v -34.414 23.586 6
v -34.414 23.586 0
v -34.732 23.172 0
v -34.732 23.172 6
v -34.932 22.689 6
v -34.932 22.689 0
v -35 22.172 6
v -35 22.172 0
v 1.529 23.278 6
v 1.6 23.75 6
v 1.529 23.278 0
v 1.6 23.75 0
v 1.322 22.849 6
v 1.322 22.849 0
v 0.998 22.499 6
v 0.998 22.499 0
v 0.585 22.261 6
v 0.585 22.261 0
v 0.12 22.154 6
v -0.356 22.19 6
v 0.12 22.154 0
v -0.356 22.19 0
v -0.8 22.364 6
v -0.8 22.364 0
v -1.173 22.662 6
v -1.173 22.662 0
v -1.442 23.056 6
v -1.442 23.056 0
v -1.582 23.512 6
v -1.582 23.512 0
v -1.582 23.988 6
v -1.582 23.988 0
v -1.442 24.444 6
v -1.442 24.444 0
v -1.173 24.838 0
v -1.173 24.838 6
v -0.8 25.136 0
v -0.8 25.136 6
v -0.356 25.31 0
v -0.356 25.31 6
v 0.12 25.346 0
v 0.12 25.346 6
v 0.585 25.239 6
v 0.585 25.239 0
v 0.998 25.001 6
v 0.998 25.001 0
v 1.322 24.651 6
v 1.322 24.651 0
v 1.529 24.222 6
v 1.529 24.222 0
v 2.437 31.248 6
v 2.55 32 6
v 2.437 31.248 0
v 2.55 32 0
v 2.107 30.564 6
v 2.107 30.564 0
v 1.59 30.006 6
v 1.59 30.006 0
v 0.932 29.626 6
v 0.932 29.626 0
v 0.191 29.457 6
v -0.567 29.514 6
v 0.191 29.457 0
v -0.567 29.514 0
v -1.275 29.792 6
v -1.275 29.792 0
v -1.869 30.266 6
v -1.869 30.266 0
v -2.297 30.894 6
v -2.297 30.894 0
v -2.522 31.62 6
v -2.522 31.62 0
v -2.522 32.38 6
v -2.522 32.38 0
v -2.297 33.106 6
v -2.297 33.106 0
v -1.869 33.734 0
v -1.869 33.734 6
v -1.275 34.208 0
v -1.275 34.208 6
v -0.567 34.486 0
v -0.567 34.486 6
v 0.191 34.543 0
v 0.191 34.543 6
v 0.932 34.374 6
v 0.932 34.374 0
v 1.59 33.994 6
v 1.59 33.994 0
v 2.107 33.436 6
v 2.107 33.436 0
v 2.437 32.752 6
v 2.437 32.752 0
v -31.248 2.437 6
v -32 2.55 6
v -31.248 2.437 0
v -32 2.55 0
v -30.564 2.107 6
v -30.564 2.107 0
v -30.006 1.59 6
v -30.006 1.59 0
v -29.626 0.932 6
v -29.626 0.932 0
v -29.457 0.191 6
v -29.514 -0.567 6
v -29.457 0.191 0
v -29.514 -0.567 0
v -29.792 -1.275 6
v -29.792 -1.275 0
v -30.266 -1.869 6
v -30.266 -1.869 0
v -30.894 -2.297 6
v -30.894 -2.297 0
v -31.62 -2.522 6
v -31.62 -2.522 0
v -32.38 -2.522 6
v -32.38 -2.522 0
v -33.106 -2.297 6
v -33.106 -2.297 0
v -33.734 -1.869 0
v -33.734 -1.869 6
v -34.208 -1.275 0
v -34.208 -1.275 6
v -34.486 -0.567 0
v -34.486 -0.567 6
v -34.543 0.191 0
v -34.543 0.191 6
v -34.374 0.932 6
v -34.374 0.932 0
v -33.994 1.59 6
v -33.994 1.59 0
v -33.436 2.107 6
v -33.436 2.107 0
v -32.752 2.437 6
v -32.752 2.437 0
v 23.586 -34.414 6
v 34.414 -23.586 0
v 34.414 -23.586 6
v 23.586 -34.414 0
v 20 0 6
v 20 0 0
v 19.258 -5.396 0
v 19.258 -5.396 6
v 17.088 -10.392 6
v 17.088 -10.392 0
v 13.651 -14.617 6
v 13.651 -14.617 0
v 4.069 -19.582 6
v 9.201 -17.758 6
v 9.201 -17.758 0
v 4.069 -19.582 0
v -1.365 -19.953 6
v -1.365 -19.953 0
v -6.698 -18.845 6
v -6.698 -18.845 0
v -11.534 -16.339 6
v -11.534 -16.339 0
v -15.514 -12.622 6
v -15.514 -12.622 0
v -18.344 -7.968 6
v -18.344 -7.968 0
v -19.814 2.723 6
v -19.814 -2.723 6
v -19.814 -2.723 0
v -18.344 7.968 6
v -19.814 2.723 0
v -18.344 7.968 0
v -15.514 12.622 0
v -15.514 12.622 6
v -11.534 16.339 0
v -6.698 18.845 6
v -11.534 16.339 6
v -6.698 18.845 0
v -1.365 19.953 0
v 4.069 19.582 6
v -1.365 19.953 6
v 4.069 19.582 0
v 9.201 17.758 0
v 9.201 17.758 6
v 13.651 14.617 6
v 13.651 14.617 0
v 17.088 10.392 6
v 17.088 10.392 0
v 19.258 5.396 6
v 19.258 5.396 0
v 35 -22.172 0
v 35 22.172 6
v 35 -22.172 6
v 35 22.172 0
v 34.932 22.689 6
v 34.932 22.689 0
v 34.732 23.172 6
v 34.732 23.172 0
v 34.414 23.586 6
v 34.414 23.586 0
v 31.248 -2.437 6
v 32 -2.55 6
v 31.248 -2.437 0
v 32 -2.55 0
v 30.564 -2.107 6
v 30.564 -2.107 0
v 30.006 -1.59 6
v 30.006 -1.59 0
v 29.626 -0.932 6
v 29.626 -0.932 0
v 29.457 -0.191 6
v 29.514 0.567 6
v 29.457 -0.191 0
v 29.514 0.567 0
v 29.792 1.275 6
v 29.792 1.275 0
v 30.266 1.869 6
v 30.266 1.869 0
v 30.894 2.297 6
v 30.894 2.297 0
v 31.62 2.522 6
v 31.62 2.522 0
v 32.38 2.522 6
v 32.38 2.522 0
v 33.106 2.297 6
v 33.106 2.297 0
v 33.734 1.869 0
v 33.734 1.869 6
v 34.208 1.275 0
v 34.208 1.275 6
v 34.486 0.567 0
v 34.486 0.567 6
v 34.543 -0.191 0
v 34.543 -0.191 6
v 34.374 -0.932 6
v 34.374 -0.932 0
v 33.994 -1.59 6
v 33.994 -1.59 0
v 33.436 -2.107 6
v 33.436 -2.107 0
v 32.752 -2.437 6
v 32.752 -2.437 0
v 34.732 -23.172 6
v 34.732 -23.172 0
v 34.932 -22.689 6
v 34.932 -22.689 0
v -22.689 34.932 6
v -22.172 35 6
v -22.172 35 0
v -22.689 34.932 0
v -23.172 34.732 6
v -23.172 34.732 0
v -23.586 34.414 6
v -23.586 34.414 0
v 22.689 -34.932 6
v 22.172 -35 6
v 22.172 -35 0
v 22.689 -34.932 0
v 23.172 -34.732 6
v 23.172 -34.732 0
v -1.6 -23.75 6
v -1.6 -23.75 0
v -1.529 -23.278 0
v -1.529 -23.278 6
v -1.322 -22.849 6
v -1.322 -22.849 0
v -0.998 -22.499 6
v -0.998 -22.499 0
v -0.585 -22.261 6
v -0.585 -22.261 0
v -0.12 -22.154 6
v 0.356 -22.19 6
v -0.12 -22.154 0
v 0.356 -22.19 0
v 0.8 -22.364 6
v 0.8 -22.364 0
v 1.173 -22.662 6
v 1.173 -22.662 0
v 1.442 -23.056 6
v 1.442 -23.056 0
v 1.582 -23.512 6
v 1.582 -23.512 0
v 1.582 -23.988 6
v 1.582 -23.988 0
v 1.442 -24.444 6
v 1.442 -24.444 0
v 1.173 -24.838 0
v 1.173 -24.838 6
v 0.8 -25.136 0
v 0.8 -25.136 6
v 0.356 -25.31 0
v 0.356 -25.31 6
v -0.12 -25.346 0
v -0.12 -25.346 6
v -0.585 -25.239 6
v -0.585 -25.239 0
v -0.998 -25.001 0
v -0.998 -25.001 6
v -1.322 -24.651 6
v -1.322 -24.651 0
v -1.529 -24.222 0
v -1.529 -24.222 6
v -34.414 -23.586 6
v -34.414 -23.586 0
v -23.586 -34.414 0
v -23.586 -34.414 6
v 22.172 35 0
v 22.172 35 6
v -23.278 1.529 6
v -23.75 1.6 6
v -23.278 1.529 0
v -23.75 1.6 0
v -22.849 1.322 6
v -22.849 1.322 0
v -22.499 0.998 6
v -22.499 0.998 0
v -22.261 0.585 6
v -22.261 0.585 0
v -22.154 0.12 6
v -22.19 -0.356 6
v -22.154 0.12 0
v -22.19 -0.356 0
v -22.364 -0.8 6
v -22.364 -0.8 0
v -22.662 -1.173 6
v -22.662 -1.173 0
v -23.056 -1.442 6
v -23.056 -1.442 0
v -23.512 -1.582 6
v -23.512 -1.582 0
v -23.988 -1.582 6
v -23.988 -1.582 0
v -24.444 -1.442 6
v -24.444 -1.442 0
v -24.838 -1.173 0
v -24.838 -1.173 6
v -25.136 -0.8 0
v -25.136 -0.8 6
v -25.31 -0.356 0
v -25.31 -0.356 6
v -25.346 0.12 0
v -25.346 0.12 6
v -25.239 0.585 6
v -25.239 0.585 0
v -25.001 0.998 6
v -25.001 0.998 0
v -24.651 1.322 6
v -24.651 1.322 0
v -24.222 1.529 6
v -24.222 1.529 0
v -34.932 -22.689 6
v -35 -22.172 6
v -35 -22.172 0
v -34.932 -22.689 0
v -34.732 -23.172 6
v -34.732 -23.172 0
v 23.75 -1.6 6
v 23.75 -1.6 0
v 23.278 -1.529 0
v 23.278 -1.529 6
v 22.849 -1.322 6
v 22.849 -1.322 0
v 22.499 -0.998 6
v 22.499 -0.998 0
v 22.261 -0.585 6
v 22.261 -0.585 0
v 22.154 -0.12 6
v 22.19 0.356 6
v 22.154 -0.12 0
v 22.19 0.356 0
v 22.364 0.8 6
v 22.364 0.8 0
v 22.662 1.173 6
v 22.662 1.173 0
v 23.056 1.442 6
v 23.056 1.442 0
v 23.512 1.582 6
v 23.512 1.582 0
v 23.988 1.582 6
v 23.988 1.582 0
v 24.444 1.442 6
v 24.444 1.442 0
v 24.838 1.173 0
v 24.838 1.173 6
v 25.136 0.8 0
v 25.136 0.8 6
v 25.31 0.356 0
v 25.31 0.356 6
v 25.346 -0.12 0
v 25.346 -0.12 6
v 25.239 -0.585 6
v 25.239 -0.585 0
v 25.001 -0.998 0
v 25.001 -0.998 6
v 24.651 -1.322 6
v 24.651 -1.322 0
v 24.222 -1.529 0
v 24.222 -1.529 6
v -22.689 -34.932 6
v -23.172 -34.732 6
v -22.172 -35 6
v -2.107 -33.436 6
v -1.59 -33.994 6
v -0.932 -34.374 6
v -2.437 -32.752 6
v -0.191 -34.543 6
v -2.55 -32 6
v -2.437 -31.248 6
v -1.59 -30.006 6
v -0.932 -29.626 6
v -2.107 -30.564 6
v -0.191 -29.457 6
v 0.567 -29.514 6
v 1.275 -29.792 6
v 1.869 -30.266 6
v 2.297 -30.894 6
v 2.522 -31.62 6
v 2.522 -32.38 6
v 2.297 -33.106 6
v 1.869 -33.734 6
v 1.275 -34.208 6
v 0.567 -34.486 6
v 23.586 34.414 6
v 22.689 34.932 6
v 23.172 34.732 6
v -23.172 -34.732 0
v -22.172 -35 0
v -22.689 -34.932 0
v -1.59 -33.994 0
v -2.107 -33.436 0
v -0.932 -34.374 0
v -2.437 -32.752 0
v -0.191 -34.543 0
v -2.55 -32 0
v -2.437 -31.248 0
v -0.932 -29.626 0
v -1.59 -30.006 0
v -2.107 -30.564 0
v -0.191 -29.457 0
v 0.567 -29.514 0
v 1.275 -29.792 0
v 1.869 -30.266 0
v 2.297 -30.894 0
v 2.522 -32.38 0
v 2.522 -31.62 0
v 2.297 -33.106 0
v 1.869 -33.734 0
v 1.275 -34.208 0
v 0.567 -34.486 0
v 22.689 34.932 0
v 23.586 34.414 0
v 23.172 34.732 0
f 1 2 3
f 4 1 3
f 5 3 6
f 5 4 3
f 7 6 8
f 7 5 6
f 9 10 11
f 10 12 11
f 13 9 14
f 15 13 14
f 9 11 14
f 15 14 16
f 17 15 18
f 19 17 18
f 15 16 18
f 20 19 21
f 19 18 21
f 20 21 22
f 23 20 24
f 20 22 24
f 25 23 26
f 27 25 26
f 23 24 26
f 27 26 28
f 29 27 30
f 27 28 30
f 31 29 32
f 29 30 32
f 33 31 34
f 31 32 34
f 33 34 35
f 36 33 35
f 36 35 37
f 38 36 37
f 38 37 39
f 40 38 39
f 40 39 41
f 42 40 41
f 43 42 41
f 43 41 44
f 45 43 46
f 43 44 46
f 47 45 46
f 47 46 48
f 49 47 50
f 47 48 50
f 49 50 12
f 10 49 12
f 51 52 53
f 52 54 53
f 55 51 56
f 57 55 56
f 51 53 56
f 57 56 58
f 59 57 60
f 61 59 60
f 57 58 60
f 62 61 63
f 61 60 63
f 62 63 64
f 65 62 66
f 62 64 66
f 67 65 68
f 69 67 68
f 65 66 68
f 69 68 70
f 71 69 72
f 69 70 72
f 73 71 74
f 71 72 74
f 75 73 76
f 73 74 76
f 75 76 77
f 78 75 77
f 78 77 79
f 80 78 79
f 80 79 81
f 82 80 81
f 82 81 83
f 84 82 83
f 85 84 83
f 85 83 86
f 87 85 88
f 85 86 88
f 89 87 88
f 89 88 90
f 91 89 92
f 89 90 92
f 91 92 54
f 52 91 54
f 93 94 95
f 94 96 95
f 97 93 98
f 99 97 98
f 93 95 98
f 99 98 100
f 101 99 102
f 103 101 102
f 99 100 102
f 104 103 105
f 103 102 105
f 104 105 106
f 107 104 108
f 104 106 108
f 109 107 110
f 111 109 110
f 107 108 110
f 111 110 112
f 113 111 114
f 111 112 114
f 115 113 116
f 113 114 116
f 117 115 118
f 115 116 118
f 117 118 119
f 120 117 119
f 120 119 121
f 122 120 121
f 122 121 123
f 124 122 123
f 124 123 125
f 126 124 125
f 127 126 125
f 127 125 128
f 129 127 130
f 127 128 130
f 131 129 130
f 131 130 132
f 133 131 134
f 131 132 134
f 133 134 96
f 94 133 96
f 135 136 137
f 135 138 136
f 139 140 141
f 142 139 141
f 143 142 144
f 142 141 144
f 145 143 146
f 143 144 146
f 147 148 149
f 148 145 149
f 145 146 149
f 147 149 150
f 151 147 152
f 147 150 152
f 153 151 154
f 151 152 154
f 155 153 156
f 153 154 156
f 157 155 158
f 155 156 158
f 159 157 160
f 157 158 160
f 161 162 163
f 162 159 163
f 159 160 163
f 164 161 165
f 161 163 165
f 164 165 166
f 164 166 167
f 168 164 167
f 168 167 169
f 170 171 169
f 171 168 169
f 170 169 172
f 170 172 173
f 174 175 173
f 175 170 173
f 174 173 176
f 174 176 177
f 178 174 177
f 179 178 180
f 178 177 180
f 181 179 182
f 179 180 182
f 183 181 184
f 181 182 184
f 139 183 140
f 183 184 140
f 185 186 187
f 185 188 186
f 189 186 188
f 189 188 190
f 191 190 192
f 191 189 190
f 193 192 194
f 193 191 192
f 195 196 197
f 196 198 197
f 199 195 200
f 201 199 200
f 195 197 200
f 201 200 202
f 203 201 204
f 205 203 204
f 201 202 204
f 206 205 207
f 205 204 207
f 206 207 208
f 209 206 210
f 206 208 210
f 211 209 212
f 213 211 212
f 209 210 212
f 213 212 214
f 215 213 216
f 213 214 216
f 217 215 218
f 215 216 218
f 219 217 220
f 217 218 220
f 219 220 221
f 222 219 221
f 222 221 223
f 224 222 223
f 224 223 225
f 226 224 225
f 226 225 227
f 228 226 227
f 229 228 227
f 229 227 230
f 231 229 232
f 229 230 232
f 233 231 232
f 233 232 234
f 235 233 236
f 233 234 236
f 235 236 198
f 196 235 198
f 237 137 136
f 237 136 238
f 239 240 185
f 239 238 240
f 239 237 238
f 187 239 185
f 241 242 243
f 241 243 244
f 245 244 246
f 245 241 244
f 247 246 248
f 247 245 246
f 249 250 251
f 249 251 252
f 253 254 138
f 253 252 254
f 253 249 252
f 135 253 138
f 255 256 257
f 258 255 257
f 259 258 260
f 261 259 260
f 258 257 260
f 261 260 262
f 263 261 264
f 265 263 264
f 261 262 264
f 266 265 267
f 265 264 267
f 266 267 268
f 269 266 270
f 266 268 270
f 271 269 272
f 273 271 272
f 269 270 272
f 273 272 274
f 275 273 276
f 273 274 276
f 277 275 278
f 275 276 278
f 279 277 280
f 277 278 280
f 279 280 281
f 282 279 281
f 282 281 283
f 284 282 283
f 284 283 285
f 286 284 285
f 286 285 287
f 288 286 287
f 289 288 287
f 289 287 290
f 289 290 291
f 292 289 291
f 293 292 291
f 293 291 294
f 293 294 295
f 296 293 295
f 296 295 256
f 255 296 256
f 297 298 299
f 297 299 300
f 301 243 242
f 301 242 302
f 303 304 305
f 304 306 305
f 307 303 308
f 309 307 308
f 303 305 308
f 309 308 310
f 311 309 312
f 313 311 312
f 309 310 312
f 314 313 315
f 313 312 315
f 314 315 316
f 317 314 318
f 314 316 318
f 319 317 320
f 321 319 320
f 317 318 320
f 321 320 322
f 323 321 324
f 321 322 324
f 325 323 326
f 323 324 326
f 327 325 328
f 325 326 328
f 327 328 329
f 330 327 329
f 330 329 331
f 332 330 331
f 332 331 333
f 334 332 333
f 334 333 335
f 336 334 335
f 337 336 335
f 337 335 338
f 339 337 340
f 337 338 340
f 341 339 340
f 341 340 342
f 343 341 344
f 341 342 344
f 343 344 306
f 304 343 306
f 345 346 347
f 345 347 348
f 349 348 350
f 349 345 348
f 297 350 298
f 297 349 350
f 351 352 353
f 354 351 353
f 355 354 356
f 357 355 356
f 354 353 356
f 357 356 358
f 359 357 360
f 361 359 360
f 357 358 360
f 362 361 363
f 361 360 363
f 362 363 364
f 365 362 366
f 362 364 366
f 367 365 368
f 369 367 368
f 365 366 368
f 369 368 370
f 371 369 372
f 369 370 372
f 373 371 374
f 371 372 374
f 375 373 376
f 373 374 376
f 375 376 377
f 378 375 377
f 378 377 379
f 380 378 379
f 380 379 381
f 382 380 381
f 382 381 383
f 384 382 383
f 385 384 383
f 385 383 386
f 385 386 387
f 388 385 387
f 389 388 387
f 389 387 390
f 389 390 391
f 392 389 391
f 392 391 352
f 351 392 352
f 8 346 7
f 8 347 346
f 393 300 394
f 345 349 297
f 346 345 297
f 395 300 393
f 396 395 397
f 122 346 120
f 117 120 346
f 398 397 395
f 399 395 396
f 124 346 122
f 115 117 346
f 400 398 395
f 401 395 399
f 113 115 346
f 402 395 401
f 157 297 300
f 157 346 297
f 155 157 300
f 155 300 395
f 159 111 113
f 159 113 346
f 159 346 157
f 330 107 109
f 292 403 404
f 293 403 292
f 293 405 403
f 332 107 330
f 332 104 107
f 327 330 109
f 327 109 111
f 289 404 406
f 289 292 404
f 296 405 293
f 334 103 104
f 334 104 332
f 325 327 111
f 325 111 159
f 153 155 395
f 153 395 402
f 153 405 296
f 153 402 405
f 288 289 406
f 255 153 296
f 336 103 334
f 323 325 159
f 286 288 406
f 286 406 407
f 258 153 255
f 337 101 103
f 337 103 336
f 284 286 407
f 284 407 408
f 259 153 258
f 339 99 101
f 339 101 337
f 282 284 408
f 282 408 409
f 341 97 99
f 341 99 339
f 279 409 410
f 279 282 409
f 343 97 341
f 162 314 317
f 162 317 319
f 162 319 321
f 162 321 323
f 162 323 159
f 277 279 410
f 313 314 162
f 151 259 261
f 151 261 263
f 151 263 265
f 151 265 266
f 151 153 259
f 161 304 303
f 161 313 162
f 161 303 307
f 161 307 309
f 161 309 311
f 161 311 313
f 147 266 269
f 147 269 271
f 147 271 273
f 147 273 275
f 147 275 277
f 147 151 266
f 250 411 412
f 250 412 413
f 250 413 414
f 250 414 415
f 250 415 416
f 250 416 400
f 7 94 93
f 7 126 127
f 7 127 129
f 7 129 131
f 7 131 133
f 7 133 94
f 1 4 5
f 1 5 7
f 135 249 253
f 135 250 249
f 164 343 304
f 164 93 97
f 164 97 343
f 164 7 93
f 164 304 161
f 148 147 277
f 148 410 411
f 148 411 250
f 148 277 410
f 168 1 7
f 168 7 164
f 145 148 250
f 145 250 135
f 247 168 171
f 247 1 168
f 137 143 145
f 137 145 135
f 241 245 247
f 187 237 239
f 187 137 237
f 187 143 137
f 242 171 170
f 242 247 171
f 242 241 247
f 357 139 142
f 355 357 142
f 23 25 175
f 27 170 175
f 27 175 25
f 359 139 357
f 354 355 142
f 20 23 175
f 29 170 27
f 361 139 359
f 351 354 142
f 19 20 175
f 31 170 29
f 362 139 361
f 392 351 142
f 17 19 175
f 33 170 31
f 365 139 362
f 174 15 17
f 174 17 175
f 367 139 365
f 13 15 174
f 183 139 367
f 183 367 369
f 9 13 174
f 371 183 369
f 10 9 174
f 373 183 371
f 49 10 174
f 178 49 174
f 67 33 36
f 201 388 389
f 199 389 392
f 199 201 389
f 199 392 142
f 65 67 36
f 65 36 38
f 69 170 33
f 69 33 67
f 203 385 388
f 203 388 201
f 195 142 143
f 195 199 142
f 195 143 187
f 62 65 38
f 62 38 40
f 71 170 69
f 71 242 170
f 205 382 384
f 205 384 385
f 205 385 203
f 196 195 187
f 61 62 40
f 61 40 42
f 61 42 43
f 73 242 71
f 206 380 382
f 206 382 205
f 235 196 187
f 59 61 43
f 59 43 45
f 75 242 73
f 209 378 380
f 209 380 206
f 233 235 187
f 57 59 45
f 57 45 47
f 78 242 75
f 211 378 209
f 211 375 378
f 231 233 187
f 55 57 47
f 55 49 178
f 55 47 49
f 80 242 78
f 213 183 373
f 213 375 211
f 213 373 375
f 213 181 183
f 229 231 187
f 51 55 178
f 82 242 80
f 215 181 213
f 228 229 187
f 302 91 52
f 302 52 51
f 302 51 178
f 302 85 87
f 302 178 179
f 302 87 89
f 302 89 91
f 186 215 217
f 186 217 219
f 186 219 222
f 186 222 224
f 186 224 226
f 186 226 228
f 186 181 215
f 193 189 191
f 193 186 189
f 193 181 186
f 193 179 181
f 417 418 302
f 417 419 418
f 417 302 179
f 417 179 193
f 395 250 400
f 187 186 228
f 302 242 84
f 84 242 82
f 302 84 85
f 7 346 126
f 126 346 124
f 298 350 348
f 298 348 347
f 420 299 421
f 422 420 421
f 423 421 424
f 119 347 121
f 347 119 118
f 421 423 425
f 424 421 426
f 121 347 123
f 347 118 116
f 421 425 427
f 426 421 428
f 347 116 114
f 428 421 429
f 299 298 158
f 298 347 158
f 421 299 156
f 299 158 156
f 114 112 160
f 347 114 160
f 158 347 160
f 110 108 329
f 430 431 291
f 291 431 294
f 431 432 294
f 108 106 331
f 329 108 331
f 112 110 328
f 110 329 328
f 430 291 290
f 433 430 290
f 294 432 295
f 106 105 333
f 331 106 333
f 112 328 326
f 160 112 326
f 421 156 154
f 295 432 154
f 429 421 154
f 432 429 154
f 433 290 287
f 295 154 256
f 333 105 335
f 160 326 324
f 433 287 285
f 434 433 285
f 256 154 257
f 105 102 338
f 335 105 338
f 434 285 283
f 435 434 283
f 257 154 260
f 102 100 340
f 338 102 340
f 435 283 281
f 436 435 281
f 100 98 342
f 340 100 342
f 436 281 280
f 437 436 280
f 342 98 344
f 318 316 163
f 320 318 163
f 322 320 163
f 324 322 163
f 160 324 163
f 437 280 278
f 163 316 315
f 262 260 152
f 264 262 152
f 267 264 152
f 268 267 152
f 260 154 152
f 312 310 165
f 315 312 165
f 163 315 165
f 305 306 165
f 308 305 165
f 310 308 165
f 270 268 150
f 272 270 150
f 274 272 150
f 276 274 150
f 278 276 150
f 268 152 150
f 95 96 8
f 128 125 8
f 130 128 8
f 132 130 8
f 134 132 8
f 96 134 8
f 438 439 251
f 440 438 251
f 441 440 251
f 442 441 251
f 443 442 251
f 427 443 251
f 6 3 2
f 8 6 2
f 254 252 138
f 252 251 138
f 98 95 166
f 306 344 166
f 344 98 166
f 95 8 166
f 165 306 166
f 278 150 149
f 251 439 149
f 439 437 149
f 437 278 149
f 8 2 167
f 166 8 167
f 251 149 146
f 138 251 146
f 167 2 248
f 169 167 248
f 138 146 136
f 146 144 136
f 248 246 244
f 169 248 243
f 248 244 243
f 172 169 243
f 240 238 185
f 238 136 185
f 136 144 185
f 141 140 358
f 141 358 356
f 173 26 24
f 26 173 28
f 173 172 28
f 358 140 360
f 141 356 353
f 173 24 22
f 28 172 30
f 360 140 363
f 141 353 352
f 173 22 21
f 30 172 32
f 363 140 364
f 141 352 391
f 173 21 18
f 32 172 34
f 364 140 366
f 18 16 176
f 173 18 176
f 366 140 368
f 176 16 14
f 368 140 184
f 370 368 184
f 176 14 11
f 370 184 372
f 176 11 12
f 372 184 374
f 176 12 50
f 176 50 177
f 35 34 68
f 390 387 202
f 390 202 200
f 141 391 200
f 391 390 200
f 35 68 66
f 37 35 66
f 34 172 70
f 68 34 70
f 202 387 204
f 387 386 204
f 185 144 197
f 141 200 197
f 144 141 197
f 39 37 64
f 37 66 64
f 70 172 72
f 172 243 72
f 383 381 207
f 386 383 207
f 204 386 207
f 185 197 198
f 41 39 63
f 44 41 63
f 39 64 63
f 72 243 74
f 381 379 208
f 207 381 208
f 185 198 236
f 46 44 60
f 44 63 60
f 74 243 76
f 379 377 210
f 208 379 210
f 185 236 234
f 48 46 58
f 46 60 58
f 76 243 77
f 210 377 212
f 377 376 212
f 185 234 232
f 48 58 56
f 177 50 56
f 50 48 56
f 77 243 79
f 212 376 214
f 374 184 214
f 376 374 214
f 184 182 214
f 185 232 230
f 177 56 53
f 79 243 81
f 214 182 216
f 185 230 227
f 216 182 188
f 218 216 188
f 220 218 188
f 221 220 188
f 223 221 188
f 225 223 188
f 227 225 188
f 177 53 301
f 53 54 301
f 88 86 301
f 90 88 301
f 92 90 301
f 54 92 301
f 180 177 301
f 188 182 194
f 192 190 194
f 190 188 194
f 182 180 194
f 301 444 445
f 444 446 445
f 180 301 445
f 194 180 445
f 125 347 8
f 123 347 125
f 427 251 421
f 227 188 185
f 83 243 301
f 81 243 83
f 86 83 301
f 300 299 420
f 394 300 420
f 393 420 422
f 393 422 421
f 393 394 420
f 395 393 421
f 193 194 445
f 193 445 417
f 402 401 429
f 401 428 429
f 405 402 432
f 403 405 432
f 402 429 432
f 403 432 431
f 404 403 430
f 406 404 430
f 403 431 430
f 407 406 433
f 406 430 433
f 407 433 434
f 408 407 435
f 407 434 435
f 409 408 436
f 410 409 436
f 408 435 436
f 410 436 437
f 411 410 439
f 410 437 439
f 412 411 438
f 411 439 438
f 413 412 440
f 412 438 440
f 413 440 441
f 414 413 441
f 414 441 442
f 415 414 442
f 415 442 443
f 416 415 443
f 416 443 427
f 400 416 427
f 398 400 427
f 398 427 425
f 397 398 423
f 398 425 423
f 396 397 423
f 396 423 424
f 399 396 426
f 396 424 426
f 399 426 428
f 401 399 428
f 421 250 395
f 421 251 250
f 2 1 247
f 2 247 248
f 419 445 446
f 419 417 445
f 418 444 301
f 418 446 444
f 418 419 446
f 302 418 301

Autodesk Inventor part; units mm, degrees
ref_plane "YZ Plane" through (0, 0, 0) normal (1, 0, 0) x (0, 1, 0)
ref_plane "XZ Plane" through (0, 0, 0) normal (0, 1, 0) x (-1, 0, 0)
ref_plane "XY Plane" through (0, 0, 0) normal (0, 0, 1) x (1, 0, 0)
sketch "Sketch1" plane through (0, 0, 0) normal (0, 0, 1) x (1, 0, 0)
  line L0 (-35, 35) -> (35, 35)
  line L1 (35, 35) -> (35, -35)
  line L2 (35, -35) -> (-35, -35)
  line L3 (-35, -35) -> (-35, 35)
  circle A0 centre (0, 0) radius 20
  point P0 (35, 0)
  point P1 (0, 35)
  dimension "d0" = 70
  dimension "d1" = 40
extrude "Extrusion1" add sketch "Sketch1" along normal blind 6
chamfer "Chamfer1" distance 12 angle 45 4 edges at (35, 35, 3) (35, -35, 3) (-35, -35, 3) (-35, 35, 3)
fillet "Fillet1" radius 2 8 edges at (-23, 35, 3) (23, 35, 3) (35, 23, 3) (35, -23, 3) (23, -35, 3) (-23, -35, 3) (-35, -23, 3) (-35, 23, 3)
sketch "Sketch2" plane through (0, 0, 6) normal (0, 0, 1) x (1, 0, 0)
  circle A0 centre (0, 0) radius 32 construction
  point P0 (32, 0)
  dimension "d8" = 64
hole "Hole1" at (32, 0, 6) direction (0, 0, -1) diameter 5.1 end through all
pattern_circular "Circular Pattern1" count 4 over 360 about axis through (0, 0, -10) along (0, 0, 1) of "Hole1"
sketch "Sketch3" plane through (0, 0, 6) normal (0, 0, 1) x (1, 0, 0)
  circle A0 centre (0, 0) radius 23.75 construction
  point P0 (23.75, 0)
  dimension "d19" = 47.5
hole "Hole2" at (23.75, 0, 6) direction (0, 0, -1) diameter 3.2 end through all
pattern_circular "Circular Pattern2" count 4 over 360 about axis through (0, 0, -10) along (0, 0, 1) of "Hole2"
properties part number "plasma-box-spacer-6mm" material "Copper"
